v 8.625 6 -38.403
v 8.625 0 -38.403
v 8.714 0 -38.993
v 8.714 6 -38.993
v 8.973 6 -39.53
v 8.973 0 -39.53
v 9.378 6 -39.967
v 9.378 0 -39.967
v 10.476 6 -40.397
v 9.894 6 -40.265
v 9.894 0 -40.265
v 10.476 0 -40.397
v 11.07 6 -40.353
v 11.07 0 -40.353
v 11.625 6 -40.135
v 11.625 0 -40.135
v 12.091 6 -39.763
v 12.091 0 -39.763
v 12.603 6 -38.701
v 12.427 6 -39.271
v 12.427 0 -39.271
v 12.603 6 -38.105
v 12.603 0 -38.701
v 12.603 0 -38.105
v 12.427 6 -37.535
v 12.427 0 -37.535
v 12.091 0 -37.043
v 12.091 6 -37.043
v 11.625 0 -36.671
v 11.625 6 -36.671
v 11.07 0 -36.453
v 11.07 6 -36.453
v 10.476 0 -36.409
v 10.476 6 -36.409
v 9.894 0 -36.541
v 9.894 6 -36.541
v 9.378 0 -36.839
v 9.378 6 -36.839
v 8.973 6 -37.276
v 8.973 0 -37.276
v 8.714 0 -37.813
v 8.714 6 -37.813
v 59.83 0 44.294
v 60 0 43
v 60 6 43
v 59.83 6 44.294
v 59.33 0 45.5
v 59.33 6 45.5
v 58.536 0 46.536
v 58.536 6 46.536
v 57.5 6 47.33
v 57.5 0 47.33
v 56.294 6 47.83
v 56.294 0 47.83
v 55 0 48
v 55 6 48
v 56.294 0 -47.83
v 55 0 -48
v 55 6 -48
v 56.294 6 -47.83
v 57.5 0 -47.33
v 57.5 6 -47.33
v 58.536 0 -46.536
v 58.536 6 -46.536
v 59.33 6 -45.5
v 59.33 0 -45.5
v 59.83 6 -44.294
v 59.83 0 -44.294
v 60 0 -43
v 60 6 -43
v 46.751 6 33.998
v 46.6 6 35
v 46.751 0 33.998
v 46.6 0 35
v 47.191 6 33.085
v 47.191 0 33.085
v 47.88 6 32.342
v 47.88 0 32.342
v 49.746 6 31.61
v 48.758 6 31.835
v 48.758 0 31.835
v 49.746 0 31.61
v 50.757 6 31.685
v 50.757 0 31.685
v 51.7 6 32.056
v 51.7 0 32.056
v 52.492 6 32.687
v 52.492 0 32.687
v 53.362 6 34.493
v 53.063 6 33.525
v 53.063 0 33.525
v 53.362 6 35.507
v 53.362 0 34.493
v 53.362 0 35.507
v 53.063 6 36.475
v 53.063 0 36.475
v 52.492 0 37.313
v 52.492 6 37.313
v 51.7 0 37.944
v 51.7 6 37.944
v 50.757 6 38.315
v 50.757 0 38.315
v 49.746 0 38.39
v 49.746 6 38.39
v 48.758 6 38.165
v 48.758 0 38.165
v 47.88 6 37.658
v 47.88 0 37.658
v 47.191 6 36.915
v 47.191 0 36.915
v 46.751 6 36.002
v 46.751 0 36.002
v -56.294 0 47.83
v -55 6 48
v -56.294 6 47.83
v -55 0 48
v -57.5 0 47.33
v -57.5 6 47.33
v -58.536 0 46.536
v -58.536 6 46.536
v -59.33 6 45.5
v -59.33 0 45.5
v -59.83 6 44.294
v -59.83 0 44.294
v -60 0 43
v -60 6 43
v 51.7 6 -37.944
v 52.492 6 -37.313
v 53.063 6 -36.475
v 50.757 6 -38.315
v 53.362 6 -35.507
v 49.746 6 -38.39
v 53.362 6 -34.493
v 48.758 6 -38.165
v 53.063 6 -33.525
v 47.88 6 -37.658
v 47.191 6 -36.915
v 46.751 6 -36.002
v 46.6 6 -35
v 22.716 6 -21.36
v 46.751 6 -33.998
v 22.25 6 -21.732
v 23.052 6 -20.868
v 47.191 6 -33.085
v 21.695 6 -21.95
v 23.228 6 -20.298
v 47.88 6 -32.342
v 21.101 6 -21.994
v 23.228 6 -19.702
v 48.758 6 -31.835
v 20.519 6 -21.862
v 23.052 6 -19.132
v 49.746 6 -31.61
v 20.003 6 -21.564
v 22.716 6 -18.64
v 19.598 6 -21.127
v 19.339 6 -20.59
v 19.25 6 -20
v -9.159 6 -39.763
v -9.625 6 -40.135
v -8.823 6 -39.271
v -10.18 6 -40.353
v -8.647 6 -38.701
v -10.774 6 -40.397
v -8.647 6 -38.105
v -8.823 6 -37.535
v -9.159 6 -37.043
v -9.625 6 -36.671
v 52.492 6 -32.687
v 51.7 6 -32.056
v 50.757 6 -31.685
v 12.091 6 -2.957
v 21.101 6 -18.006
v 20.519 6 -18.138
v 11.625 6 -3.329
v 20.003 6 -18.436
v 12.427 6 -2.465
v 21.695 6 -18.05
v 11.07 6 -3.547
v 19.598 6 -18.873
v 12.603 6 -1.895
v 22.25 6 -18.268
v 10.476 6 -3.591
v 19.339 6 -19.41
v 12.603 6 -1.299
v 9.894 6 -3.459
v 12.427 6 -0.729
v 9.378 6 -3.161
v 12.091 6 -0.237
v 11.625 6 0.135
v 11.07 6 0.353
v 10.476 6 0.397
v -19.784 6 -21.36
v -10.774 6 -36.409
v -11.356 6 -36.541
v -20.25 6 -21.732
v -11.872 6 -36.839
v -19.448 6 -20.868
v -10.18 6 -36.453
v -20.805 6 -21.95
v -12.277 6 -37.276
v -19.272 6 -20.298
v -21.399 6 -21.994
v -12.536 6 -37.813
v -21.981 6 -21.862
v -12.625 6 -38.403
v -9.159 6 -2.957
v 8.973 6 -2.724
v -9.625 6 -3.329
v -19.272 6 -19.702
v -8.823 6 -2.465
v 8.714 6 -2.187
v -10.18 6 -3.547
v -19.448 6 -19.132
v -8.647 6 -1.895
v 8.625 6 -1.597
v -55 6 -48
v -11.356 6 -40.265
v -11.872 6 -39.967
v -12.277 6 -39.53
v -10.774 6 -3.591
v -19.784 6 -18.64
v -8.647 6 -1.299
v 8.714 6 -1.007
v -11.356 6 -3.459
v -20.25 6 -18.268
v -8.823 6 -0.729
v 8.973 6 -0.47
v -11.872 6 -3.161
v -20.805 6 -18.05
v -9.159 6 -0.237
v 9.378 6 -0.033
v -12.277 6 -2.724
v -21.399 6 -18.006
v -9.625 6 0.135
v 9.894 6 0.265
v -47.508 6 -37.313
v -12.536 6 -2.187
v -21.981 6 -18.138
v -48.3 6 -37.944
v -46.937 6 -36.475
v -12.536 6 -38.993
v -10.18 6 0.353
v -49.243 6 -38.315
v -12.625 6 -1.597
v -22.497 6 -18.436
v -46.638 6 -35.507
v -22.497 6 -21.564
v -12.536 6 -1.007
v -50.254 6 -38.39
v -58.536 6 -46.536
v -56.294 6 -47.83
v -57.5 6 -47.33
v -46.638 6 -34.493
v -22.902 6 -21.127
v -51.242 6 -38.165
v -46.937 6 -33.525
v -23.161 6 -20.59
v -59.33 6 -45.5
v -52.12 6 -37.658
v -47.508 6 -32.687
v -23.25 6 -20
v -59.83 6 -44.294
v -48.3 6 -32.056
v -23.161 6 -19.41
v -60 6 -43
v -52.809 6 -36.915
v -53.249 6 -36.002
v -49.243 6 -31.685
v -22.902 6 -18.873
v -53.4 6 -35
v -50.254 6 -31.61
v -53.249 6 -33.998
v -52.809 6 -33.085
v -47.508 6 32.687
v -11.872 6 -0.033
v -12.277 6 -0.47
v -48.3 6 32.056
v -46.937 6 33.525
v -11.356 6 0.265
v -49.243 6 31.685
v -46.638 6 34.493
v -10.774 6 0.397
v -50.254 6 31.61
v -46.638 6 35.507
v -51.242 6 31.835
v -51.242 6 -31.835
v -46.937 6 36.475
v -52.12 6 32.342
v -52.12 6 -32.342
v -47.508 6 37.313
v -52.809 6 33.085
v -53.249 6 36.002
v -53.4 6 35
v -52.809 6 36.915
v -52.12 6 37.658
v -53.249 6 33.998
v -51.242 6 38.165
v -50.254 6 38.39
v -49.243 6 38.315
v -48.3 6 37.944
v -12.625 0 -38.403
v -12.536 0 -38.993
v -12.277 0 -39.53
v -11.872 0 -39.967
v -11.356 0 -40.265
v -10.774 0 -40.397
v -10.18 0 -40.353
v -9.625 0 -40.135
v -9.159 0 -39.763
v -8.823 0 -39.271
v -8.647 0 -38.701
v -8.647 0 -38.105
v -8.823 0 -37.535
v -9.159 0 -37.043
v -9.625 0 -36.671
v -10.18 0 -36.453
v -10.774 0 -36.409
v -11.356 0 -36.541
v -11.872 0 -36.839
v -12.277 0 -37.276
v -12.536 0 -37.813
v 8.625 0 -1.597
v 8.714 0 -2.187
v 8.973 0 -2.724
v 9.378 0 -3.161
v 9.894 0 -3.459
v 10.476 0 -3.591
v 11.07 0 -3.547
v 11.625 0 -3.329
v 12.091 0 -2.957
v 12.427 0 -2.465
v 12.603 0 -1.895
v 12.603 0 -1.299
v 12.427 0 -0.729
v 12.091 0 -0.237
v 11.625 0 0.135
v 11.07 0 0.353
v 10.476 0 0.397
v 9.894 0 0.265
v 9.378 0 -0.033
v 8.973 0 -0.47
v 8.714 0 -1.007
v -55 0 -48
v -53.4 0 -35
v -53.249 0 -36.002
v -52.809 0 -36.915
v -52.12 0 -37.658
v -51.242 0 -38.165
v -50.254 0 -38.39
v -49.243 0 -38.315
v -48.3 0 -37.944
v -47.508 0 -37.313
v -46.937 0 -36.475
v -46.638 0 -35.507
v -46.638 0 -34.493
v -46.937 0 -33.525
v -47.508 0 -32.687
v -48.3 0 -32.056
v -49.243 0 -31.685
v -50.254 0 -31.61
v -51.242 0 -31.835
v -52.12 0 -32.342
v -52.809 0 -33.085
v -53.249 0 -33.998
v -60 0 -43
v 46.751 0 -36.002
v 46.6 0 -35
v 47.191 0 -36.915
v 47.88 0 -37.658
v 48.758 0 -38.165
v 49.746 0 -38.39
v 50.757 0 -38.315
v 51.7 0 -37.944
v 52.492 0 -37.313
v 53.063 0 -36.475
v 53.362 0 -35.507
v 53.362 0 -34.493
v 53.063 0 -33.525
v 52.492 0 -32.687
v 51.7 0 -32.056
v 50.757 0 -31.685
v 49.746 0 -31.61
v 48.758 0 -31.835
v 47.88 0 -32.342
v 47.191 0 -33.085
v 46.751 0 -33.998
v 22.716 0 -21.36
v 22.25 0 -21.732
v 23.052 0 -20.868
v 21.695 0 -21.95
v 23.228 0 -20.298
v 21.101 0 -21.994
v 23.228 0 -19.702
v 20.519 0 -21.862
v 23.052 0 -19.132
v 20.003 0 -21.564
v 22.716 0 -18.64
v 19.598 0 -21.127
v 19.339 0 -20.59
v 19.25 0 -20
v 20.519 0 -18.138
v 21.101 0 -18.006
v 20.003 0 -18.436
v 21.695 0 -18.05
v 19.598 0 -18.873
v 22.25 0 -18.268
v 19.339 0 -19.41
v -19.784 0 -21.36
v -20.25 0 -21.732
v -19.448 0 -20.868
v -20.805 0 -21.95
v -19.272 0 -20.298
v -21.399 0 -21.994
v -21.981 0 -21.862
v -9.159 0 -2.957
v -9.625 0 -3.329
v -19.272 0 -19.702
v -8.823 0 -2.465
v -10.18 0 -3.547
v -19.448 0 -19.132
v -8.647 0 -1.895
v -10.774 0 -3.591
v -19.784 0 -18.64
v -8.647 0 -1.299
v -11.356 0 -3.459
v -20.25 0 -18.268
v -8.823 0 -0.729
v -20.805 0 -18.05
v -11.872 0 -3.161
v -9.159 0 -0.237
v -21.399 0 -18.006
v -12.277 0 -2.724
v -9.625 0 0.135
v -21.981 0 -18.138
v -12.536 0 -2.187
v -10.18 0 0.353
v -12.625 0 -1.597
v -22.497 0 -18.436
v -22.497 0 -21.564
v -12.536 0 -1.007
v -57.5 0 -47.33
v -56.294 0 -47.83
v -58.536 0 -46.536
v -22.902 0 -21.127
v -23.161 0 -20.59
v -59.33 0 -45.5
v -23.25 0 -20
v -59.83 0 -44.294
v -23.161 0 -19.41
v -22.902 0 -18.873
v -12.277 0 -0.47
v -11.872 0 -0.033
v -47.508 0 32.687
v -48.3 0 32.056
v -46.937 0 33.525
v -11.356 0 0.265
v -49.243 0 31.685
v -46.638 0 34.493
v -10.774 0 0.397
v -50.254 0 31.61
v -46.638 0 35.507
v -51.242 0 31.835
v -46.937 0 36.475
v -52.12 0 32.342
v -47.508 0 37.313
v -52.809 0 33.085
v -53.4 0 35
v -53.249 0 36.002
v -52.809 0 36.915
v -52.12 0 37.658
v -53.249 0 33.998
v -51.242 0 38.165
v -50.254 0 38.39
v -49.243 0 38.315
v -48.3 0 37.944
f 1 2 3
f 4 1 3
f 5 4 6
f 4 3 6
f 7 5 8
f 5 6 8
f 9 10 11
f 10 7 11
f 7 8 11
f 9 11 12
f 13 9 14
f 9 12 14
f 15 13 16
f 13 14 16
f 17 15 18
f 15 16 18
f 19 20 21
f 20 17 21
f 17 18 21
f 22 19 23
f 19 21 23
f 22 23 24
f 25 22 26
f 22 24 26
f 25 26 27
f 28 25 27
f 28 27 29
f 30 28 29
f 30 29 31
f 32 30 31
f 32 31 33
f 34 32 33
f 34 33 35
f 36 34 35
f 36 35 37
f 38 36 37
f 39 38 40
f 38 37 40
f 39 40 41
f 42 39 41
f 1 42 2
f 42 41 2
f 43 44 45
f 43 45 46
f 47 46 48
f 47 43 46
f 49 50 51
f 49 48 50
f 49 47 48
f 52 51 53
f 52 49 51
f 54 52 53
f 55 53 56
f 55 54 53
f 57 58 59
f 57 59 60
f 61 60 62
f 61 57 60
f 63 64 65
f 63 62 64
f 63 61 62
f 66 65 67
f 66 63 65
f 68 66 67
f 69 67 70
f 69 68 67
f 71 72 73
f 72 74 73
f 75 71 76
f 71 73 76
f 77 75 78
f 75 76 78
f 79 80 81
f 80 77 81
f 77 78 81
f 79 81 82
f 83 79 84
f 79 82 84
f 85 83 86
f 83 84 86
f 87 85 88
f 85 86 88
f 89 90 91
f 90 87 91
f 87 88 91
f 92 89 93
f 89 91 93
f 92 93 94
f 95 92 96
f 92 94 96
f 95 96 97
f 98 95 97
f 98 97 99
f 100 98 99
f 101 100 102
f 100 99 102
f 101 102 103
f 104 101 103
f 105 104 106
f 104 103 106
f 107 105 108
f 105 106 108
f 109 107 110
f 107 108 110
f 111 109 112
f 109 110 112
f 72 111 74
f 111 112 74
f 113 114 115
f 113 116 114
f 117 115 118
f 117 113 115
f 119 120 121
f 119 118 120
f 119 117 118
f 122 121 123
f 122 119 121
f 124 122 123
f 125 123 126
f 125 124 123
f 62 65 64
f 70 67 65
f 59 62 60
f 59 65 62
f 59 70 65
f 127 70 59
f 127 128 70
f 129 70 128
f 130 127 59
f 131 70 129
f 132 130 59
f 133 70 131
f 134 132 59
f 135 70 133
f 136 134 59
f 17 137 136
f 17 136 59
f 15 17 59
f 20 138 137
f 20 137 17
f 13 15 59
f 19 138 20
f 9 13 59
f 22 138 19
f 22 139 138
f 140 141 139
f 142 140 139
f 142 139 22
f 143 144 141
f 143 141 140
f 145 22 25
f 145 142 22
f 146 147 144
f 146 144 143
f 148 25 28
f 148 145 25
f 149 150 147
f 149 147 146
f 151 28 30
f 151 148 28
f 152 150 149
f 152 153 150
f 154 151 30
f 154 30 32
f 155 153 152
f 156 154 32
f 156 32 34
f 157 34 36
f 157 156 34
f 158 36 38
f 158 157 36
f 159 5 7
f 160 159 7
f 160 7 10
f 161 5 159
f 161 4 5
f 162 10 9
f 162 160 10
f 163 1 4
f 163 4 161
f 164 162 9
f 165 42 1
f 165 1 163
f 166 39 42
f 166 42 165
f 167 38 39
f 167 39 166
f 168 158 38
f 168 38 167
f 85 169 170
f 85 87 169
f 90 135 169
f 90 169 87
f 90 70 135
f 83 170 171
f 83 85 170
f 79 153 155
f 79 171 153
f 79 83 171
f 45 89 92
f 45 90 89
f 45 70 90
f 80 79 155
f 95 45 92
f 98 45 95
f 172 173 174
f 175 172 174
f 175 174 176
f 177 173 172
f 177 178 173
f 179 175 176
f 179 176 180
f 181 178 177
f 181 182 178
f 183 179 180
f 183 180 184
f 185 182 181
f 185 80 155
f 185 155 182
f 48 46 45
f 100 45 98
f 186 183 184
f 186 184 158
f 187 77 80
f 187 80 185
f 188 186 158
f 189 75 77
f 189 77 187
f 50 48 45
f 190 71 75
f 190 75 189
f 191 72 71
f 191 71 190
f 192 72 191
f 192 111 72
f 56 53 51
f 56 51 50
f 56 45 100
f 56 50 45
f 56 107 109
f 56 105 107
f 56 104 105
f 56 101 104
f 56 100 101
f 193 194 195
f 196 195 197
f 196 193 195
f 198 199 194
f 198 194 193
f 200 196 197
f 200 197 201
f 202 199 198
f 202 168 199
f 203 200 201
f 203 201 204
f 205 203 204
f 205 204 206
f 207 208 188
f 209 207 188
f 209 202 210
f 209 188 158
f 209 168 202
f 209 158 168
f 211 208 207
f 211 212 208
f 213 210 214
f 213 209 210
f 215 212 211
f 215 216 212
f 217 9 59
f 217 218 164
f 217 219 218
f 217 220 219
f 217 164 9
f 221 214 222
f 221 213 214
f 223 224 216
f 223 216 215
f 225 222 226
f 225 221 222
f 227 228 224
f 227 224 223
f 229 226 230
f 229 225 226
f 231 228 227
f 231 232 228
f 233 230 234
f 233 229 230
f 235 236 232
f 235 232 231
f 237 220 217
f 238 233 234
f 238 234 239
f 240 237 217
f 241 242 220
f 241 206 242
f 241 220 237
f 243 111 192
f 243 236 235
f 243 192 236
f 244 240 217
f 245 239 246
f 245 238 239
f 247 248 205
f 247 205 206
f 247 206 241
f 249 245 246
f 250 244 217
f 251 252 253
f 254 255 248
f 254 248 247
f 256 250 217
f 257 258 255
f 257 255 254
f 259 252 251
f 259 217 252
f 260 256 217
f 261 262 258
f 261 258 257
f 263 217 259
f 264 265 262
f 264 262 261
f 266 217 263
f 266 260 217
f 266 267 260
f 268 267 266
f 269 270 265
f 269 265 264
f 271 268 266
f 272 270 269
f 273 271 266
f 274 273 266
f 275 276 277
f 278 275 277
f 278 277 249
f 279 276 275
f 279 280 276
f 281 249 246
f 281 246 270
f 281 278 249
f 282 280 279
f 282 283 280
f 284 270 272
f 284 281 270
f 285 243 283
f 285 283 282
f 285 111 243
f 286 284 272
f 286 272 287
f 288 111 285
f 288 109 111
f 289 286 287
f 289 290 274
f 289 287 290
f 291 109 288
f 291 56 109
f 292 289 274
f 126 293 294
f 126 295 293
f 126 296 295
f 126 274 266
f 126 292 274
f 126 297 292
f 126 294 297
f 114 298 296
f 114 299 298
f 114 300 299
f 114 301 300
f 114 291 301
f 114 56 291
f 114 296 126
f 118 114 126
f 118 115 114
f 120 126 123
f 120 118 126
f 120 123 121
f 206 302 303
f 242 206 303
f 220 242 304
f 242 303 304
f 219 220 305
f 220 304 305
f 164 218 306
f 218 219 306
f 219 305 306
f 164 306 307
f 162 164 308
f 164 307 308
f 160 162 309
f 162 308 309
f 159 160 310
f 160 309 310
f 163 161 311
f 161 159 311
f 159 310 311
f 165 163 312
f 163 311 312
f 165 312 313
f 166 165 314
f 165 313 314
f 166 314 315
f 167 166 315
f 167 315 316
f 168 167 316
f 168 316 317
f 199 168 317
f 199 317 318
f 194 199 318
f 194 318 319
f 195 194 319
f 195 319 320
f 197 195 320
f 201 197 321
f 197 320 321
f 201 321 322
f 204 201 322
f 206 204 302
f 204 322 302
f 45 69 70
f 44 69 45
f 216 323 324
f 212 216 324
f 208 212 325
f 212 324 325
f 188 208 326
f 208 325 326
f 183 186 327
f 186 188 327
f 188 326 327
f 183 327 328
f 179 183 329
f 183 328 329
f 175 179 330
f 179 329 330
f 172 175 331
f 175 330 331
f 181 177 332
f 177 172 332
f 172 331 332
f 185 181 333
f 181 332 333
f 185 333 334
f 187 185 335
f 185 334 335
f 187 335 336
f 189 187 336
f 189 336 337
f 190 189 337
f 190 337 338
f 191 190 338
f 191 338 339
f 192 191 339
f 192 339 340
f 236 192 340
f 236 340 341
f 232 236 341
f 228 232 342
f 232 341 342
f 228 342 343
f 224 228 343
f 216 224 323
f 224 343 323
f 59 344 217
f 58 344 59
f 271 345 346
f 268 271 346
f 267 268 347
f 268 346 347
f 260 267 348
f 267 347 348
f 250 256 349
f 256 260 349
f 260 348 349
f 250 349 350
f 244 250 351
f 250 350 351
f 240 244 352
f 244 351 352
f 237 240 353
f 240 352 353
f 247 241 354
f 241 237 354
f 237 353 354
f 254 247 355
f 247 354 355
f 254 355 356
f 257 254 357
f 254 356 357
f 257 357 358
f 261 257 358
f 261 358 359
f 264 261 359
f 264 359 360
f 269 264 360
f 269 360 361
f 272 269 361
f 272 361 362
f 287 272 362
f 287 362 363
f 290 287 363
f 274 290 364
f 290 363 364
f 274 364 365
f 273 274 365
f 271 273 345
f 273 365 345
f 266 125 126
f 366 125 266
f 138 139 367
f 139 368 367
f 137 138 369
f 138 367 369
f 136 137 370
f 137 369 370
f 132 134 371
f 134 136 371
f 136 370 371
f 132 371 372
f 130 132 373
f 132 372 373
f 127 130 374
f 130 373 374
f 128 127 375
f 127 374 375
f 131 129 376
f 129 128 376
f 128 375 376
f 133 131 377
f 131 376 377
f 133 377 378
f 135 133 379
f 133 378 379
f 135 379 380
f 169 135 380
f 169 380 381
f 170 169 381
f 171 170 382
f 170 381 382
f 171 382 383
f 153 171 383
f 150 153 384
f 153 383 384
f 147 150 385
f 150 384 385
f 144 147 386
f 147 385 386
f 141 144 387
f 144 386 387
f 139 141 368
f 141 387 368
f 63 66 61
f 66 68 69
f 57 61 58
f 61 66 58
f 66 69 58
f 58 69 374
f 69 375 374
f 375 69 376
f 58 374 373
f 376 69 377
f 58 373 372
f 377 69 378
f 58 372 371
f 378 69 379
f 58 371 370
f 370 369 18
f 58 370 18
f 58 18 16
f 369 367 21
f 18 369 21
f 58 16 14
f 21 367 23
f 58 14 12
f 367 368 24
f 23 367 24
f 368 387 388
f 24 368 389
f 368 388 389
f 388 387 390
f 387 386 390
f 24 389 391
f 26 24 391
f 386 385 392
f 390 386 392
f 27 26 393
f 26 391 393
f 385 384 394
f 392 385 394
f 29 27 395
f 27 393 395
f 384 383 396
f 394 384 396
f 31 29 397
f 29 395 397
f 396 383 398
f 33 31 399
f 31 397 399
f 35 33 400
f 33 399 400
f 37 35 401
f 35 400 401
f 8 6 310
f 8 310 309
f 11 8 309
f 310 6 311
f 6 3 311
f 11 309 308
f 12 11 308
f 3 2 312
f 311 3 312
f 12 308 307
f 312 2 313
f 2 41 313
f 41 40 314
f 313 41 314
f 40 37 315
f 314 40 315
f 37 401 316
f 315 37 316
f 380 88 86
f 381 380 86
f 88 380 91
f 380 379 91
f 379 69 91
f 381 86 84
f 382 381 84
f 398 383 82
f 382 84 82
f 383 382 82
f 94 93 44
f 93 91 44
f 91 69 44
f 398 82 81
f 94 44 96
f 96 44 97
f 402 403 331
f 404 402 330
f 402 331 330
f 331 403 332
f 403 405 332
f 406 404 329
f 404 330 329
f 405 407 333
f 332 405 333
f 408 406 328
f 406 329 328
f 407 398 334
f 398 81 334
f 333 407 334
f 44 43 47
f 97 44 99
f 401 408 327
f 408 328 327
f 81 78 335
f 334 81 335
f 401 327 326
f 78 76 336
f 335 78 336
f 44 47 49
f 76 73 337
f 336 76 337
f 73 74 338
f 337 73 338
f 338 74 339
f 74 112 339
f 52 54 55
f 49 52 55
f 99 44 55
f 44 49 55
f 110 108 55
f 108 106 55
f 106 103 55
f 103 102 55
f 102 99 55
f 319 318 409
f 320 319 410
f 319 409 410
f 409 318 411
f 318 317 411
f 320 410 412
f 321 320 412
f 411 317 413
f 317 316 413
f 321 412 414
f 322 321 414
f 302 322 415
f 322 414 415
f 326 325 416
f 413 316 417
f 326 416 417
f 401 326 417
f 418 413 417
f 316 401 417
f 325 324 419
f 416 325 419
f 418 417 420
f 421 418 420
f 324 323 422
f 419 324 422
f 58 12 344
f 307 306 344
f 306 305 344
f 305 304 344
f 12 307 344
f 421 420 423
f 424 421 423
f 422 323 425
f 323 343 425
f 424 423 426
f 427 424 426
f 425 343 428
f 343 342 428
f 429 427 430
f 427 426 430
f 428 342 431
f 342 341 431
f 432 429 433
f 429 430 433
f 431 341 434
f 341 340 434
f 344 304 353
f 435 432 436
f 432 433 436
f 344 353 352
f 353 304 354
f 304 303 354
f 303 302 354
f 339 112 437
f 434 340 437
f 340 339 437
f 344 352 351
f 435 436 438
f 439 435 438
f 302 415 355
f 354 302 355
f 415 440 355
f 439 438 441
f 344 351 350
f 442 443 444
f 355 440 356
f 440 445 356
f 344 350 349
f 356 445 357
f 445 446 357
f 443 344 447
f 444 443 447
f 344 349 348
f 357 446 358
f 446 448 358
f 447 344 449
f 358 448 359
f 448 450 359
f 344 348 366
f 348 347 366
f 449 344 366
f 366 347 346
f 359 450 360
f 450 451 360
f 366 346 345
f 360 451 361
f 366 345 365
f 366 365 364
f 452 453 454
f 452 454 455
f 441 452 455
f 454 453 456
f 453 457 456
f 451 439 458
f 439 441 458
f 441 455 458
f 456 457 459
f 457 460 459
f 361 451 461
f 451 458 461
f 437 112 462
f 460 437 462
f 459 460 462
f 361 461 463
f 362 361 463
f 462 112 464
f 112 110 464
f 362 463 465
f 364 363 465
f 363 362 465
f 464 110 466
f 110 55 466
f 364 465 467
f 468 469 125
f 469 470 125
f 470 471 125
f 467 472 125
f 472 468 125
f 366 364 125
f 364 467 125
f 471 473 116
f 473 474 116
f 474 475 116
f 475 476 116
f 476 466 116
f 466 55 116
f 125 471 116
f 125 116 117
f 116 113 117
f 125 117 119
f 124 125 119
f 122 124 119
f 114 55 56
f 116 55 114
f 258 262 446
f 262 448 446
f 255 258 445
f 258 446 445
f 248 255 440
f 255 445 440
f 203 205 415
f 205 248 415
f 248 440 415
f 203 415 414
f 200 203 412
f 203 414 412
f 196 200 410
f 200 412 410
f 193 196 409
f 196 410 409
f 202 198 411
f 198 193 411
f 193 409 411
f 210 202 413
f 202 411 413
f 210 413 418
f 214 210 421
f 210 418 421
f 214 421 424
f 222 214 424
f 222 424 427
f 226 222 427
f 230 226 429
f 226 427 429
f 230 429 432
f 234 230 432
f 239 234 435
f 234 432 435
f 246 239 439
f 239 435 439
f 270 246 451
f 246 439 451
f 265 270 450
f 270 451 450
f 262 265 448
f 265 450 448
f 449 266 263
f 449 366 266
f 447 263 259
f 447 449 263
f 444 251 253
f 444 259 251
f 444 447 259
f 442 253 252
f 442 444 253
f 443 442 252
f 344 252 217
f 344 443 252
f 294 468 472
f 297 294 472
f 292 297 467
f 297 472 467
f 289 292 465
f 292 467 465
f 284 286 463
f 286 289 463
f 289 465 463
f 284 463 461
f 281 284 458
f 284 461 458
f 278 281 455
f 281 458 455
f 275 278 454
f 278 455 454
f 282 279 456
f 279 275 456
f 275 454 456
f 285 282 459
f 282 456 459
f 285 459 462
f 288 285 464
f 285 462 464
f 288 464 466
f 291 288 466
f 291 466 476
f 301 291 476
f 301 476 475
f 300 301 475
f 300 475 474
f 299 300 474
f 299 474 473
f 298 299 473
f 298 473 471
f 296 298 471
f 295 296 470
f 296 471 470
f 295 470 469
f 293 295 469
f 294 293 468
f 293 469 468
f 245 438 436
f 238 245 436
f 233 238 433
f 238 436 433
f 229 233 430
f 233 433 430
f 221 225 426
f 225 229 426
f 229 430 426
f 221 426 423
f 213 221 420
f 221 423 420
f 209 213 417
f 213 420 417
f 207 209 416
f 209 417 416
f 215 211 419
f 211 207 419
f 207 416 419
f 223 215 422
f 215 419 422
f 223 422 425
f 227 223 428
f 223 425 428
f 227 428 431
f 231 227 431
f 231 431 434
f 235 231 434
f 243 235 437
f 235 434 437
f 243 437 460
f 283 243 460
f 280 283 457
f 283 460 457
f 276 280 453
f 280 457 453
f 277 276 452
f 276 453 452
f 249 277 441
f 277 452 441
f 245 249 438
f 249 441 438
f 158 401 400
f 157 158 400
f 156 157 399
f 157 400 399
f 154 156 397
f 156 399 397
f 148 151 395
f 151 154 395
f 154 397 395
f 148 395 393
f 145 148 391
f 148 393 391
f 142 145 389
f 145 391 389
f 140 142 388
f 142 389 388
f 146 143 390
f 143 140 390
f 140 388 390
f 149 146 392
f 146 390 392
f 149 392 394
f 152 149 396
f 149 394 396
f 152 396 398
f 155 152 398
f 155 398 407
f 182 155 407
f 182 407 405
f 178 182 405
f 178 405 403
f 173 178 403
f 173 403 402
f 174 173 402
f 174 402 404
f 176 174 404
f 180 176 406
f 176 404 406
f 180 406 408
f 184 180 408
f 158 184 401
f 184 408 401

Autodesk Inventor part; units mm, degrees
ref_plane "YZ Plane" through (0, 0, 0) normal (1, 0, 0) x (0, 1, 0)
ref_plane "XZ Plane" through (0, 0, 0) normal (0, 1, 0) x (-1, 0, 0)
ref_plane "XY Plane" through (0, 0, 0) normal (0, 0, 1) x (1, 0, 0)
sketch "Sketch1" plane through (0, 0, 0) normal (0, 1, 0) x (-1, 0, 0)
  line L0 (55, -48) -> (-55, -48)
  line L1 (-60, -43) -> (-60, 43)
  line L2 (-55, 48) -> (55, 48)
  line L3 (60, 43) -> (60, -43)
  line L4 (50, -35) -> (-50, -35) construction
  line L5 (-50, -35) -> (-50, 35) construction
  line L6 (-50, 35) -> (50, 35) construction
  line L7 (50, 35) -> (50, -35) construction
  arc A0 (60, 43) -> (55, 48) centre (55, 43) ccw
  arc A1 (-55, 48) -> (-60, 43) centre (-55, 43) ccw
  arc A2 (-60, -43) -> (-55, -48) centre (-55, -43) ccw
  arc A3 (55, -48) -> (60, -43) centre (55, -43) ccw
  circle A4 centre (50, -35) radius 3.4
  circle A5 centre (50, 35) radius 3.4
  circle A6 centre (-50, -35) radius 3.4
  circle A7 centre (-50, 35) radius 3.4
  line L8 (0, -20) -> (0, 20) construction
  line L9 (25, -20) -> (25, 20) construction
  line L10 (-25, 20) -> (-25, -20) construction
  arc A8 (-25, -20) -> (25, -20) centre (0, -20) ccw construction
  arc A9 (25, 20) -> (-25, 20) centre (0, 20) ccw construction
  circle A10 centre (0, -20) radius 21.25 construction
  circle A11 centre (-21.25, -20) radius 2
  circle A12 centre (-10.625, -38.403) radius 2
  circle A13 centre (10.625, -38.403) radius 2
  circle A14 centre (21.25, -20) radius 2
  circle A15 centre (10.625, -1.597) radius 2
  circle A16 centre (-10.625, -1.597) radius 2
  point P0 (0, 0)
  point P1 (-60, 0)
  point P2 (0, -48)
  point P3 (0, -35)
  point P4 (-50, 0)
  point P5 (0, 0)
  dimension "d17" = 42.5
  dimension "d0" = 96
  dimension "d1" = 120
  dimension "d2" = 70
  dimension "d3" = 100
  dimension "d4" = 5
  dimension "d5" = 6.8
  dimension "d6" = 6.8
  dimension "d8" = 6.8
  dimension "d10" = 6.8
  dimension "d13" = 25
  dimension "d14" = 40
  dimension "d23" = 4
  dimension "d26" = 360
extrude "Extrusion1" add sketch "Sketch1" along normal blind 6
equation "\"d17\" = iciclesMountD"
equation "\"d0\" = moduleHeight"
equation "\"d1\" = moduleWidth"
equation "\"d2\" = moduleMountH"
equation "\"d3\" = moduleMountW"
equation "\"d4\" = moduleCornerR"
equation "\"d5\" = moduleMountD"
equation "\"d6\" = moduleMountD"
equation "\"d8\" = moduleMountD"
equation "\"d10\" = moduleMountD"
equation "\"d13\" = moduleOpeningR"
equation "\"d14\" = moduleOpeningH"
equation "\"d23\" = insertDrillM3"
equation "\"d15\" = thickness"
equation "\"moduleWidth\" = 120"
equation "\"moduleHeight\" = 96"
equation "\"moduleMountW\" = 100"
equation "\"moduleMountH\" = 70"
equation "\"moduleMountD\" = 6.8"
equation "\"moduleCornerR\" = 5"
equation "\"moduleOpeningR\" = 25"
equation "\"moduleOpeningH\" = 40"
equation "\"thickness\" = 6"
equation "\"iciclesMountD\" = 42.5"
equation "\"insertDrillM3\" = 4"
properties part number "Module_base_Icicles26"
